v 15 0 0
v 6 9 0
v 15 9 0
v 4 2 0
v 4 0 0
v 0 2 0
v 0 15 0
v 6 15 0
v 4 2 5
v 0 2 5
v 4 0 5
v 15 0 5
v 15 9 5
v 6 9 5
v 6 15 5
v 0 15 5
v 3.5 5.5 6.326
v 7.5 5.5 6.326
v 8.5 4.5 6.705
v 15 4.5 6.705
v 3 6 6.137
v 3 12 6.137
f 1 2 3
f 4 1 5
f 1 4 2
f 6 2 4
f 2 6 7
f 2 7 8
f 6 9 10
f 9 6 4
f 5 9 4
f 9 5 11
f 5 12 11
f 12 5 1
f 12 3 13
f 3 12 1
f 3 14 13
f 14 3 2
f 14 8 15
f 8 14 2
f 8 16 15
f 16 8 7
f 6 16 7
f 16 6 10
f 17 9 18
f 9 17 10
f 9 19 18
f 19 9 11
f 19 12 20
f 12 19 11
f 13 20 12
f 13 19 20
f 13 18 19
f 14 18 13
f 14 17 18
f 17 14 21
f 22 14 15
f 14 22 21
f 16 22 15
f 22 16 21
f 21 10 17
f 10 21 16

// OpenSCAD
CubePoints = [
[0.0, 2.0, 0.0],
[4.0, 2.0, 0.0],
[4.0, 0.0, 0.0],
[15.0, 0.0, 0.0],
[15.0, 9.0, 0.0],
[6.0, 9.0, 0.0],
[6.0, 15.0, 0.0],
[0.0, 15.0, 0.0],
[0.0, 2.0, 5.0],
[4.0, 2.0, 5.0],
[4.0, 0.0, 5.0],//10
[15.0, 0.0, 5.0],
[15.0, 9.0, 5.0],
[6.0, 9.0, 5.0],
[6.0, 15.0, 5.0],
[0.0, 15.0, 5.0],
[3.0, 12.0, 6.136812145889036],//16
[3.0, 6.0, 6.136812145889036],//17
[3.5, 5.5, 6.326280836870541],
[7.5, 5.5, 6.326280836870541],
[8.5, 4.5, 6.705218218833554],//20
[15.0, 4.5, 6.705218218833554]//21
];

CubeFaces = [
[0, 1, 2, 3, 4, 5, 6, 7],
[0, 8, 9, 1],
[1, 9, 10, 2],
[2, 10, 11, 3],
[3, 11, 12, 4],
[4, 12, 13, 5],
[5, 13, 14, 6],
[6, 14, 15, 7],
[7, 15, 8, 0],
[8, 18,  19, 9],
[9, 19, 20, 10],
[10, 20, 21, 11],
[11, 21, 12],
[12, 21, 20, 19, 18, 17, 13],
[13, 17, 16, 14],
[14, 16, 15],
[15, 16, 17, 18, 8]];

polyhedron( CubePoints, CubeFaces );
